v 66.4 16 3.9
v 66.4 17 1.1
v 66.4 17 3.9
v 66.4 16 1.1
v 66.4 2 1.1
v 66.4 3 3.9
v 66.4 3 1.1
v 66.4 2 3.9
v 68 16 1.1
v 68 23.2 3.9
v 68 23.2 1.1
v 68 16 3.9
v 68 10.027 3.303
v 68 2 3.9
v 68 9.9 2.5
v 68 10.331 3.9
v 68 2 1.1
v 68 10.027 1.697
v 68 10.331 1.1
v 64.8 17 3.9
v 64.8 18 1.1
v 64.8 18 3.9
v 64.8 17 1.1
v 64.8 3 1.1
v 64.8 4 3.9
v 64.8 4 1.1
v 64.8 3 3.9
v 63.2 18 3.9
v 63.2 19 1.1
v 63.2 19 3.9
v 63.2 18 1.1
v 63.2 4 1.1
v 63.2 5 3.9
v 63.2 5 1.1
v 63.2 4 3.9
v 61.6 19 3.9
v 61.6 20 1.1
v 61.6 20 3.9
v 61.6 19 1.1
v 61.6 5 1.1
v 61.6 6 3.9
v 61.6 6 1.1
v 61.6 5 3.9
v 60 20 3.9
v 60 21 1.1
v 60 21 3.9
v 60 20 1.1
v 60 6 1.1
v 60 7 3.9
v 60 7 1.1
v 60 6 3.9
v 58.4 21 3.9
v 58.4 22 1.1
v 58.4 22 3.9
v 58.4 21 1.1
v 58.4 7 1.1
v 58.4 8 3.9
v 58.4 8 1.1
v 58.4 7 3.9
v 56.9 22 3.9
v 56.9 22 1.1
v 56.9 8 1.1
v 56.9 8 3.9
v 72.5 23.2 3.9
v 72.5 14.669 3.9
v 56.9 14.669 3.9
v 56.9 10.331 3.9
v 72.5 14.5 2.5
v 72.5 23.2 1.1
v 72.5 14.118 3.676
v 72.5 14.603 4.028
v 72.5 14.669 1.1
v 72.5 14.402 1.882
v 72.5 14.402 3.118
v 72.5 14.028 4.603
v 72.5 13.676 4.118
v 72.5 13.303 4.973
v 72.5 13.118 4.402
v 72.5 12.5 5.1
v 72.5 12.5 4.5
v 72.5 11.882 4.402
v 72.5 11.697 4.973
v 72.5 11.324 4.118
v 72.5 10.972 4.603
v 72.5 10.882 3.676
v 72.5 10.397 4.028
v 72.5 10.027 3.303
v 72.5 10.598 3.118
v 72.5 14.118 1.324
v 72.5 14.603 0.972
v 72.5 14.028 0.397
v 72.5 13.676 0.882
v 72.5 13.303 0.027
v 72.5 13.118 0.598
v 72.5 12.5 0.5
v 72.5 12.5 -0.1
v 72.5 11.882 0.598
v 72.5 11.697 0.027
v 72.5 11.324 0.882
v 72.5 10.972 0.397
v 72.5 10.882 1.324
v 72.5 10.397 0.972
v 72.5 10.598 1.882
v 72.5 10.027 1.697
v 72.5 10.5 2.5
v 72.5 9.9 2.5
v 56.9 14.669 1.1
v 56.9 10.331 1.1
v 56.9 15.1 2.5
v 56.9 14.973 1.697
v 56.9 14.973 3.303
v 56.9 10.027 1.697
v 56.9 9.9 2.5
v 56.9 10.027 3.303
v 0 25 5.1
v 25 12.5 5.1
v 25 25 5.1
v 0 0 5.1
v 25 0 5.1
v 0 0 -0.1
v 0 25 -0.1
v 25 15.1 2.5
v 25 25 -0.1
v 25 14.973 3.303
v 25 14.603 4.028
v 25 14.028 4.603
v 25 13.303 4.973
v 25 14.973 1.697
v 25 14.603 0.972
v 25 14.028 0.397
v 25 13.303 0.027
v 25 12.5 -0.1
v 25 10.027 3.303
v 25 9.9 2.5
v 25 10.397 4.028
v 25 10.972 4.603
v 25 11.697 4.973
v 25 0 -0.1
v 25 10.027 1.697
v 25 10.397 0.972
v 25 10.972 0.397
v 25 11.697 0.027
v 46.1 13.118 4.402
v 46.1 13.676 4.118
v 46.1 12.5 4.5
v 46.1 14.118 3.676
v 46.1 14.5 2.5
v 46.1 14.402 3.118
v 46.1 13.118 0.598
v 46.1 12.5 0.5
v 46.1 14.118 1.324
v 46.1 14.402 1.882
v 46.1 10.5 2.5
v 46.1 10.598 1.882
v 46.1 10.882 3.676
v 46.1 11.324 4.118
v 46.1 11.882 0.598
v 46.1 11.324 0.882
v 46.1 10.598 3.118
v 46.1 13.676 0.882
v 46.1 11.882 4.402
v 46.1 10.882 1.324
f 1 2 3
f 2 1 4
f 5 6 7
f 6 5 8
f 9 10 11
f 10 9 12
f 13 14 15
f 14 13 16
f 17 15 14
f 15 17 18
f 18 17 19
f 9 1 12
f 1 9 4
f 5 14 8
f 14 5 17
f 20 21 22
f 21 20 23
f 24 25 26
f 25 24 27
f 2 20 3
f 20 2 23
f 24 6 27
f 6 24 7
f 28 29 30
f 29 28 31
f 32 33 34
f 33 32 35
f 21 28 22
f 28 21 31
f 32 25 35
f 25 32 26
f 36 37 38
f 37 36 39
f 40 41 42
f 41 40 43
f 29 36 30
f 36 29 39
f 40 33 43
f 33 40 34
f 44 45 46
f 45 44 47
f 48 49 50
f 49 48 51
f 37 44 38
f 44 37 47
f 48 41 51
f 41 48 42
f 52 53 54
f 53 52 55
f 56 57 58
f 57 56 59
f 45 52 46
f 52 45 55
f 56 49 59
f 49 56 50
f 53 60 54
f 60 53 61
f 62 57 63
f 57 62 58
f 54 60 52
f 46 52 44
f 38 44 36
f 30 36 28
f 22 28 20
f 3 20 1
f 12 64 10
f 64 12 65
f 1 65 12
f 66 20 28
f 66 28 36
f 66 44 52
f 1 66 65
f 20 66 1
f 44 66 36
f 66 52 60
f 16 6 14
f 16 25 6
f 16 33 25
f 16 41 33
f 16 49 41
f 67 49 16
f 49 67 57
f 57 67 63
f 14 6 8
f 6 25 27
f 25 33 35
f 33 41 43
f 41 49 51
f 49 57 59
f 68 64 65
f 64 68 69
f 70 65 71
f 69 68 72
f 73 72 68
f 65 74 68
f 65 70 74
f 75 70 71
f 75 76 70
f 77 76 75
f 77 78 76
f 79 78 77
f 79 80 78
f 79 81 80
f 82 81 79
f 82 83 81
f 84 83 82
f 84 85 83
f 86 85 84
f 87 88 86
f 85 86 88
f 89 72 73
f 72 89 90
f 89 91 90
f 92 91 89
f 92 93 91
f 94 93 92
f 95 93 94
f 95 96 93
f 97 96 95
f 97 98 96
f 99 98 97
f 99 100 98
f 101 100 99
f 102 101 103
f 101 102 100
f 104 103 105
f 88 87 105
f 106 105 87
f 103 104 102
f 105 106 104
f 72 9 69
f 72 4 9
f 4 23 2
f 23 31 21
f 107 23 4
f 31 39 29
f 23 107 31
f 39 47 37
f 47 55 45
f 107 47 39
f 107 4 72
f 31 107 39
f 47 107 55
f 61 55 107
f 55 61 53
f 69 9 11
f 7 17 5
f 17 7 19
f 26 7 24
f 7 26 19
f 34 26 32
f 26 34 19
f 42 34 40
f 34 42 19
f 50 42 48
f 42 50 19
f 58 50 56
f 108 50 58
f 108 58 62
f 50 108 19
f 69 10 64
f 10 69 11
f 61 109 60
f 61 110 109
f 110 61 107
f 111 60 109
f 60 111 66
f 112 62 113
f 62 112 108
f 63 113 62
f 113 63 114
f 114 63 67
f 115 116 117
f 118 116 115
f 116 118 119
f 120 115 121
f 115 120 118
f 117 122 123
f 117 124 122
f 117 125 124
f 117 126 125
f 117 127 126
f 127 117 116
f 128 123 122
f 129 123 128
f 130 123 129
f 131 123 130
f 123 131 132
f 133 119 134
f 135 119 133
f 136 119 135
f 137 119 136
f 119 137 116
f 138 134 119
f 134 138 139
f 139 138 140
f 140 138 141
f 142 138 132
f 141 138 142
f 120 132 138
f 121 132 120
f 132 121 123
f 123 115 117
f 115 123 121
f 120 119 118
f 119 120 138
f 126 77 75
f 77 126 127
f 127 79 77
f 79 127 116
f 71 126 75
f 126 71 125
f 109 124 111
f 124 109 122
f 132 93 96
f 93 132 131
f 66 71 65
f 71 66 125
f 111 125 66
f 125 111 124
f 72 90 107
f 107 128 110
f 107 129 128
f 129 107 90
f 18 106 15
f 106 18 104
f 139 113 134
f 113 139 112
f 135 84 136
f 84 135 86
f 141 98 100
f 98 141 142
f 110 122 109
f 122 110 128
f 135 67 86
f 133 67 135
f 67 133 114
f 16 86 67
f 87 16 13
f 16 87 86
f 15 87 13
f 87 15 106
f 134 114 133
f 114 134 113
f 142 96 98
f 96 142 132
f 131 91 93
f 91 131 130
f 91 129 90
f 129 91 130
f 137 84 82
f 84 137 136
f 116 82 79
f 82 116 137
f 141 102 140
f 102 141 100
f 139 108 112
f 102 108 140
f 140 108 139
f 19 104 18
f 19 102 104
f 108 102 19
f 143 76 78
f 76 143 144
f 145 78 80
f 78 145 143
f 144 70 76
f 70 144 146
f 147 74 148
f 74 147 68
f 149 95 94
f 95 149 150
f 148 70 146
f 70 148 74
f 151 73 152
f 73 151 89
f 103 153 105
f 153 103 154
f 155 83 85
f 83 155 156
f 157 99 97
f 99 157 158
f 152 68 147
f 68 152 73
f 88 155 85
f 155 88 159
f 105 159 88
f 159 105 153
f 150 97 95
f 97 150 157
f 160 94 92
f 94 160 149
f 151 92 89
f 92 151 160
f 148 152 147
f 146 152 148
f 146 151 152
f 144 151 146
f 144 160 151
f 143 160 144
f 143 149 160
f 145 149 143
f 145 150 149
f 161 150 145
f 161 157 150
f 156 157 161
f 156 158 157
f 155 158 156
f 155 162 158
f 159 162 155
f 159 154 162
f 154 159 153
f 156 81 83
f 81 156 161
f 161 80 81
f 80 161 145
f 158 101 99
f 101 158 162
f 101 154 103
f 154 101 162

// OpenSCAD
//Feinheit der Zylinder
feinheit=20;

//Tiefe - Put ur own magic values here
sb  = [0,8.5,1,2,3,4,5,6,7];

// more magic values
sbc= [0,45,16,16,16,16,16,16,16];

//Stützen zum Druck
s=false;

function sbd(n) = n > 0 ? sbc[n] + sbd(n-1) : sbc[0];

scale([0.1,0.1,0.1]) translate([725,125,25]) rotate([0,-90,0]) key();

module key(){
	difference(){
		union(){
			translate([0,0,600]) scale([52,250,250]) cube(1, center=true); // Griff
			cylinder(h=500, r=52/2, $fn=feinheit); // Zentralzylinder
			//translate([0,0,156/2]) cube([28,240,156], center=true);
			bart();
			if (s==true){
				intersection(){
					stuetze();
					translate([-20,0,0]) bart();
					}
			}
		}
		translate([0,0,-1]){
			cylinder(h=265, r=40/2, $fn=feinheit); // Negativzylinder
		}
	}
}

module stuetze(){
	for(i=[1,3,4,5,6]){
		translate([-15,-10*i-23,0]) scale([-10,2,sbd(8)]) cube(1);
	}
	for(i=[1,3,4,5,6,8,8.7]){
		translate([-15,10*i+23,0]) scale([-10,2,sbd(8)]) cube(1);
	}
}

module bart(){
	intersection(){
		translate([0,0,156/2]) cube([28,240,156], center=true); // Platte
		union(){
			for (i=[2:8]){
				translate([-29/2,(25+sb[i]*10)-140, sbd(i-1)])
				scale([29,140,sbc[i]])
				cube(1);
			}
			translate([0,(sb[1])*5+2,sbc[1]/2]) cube([28,(sb[1]+4)*10,sbc[1]], center=true);
		}
	}
}
